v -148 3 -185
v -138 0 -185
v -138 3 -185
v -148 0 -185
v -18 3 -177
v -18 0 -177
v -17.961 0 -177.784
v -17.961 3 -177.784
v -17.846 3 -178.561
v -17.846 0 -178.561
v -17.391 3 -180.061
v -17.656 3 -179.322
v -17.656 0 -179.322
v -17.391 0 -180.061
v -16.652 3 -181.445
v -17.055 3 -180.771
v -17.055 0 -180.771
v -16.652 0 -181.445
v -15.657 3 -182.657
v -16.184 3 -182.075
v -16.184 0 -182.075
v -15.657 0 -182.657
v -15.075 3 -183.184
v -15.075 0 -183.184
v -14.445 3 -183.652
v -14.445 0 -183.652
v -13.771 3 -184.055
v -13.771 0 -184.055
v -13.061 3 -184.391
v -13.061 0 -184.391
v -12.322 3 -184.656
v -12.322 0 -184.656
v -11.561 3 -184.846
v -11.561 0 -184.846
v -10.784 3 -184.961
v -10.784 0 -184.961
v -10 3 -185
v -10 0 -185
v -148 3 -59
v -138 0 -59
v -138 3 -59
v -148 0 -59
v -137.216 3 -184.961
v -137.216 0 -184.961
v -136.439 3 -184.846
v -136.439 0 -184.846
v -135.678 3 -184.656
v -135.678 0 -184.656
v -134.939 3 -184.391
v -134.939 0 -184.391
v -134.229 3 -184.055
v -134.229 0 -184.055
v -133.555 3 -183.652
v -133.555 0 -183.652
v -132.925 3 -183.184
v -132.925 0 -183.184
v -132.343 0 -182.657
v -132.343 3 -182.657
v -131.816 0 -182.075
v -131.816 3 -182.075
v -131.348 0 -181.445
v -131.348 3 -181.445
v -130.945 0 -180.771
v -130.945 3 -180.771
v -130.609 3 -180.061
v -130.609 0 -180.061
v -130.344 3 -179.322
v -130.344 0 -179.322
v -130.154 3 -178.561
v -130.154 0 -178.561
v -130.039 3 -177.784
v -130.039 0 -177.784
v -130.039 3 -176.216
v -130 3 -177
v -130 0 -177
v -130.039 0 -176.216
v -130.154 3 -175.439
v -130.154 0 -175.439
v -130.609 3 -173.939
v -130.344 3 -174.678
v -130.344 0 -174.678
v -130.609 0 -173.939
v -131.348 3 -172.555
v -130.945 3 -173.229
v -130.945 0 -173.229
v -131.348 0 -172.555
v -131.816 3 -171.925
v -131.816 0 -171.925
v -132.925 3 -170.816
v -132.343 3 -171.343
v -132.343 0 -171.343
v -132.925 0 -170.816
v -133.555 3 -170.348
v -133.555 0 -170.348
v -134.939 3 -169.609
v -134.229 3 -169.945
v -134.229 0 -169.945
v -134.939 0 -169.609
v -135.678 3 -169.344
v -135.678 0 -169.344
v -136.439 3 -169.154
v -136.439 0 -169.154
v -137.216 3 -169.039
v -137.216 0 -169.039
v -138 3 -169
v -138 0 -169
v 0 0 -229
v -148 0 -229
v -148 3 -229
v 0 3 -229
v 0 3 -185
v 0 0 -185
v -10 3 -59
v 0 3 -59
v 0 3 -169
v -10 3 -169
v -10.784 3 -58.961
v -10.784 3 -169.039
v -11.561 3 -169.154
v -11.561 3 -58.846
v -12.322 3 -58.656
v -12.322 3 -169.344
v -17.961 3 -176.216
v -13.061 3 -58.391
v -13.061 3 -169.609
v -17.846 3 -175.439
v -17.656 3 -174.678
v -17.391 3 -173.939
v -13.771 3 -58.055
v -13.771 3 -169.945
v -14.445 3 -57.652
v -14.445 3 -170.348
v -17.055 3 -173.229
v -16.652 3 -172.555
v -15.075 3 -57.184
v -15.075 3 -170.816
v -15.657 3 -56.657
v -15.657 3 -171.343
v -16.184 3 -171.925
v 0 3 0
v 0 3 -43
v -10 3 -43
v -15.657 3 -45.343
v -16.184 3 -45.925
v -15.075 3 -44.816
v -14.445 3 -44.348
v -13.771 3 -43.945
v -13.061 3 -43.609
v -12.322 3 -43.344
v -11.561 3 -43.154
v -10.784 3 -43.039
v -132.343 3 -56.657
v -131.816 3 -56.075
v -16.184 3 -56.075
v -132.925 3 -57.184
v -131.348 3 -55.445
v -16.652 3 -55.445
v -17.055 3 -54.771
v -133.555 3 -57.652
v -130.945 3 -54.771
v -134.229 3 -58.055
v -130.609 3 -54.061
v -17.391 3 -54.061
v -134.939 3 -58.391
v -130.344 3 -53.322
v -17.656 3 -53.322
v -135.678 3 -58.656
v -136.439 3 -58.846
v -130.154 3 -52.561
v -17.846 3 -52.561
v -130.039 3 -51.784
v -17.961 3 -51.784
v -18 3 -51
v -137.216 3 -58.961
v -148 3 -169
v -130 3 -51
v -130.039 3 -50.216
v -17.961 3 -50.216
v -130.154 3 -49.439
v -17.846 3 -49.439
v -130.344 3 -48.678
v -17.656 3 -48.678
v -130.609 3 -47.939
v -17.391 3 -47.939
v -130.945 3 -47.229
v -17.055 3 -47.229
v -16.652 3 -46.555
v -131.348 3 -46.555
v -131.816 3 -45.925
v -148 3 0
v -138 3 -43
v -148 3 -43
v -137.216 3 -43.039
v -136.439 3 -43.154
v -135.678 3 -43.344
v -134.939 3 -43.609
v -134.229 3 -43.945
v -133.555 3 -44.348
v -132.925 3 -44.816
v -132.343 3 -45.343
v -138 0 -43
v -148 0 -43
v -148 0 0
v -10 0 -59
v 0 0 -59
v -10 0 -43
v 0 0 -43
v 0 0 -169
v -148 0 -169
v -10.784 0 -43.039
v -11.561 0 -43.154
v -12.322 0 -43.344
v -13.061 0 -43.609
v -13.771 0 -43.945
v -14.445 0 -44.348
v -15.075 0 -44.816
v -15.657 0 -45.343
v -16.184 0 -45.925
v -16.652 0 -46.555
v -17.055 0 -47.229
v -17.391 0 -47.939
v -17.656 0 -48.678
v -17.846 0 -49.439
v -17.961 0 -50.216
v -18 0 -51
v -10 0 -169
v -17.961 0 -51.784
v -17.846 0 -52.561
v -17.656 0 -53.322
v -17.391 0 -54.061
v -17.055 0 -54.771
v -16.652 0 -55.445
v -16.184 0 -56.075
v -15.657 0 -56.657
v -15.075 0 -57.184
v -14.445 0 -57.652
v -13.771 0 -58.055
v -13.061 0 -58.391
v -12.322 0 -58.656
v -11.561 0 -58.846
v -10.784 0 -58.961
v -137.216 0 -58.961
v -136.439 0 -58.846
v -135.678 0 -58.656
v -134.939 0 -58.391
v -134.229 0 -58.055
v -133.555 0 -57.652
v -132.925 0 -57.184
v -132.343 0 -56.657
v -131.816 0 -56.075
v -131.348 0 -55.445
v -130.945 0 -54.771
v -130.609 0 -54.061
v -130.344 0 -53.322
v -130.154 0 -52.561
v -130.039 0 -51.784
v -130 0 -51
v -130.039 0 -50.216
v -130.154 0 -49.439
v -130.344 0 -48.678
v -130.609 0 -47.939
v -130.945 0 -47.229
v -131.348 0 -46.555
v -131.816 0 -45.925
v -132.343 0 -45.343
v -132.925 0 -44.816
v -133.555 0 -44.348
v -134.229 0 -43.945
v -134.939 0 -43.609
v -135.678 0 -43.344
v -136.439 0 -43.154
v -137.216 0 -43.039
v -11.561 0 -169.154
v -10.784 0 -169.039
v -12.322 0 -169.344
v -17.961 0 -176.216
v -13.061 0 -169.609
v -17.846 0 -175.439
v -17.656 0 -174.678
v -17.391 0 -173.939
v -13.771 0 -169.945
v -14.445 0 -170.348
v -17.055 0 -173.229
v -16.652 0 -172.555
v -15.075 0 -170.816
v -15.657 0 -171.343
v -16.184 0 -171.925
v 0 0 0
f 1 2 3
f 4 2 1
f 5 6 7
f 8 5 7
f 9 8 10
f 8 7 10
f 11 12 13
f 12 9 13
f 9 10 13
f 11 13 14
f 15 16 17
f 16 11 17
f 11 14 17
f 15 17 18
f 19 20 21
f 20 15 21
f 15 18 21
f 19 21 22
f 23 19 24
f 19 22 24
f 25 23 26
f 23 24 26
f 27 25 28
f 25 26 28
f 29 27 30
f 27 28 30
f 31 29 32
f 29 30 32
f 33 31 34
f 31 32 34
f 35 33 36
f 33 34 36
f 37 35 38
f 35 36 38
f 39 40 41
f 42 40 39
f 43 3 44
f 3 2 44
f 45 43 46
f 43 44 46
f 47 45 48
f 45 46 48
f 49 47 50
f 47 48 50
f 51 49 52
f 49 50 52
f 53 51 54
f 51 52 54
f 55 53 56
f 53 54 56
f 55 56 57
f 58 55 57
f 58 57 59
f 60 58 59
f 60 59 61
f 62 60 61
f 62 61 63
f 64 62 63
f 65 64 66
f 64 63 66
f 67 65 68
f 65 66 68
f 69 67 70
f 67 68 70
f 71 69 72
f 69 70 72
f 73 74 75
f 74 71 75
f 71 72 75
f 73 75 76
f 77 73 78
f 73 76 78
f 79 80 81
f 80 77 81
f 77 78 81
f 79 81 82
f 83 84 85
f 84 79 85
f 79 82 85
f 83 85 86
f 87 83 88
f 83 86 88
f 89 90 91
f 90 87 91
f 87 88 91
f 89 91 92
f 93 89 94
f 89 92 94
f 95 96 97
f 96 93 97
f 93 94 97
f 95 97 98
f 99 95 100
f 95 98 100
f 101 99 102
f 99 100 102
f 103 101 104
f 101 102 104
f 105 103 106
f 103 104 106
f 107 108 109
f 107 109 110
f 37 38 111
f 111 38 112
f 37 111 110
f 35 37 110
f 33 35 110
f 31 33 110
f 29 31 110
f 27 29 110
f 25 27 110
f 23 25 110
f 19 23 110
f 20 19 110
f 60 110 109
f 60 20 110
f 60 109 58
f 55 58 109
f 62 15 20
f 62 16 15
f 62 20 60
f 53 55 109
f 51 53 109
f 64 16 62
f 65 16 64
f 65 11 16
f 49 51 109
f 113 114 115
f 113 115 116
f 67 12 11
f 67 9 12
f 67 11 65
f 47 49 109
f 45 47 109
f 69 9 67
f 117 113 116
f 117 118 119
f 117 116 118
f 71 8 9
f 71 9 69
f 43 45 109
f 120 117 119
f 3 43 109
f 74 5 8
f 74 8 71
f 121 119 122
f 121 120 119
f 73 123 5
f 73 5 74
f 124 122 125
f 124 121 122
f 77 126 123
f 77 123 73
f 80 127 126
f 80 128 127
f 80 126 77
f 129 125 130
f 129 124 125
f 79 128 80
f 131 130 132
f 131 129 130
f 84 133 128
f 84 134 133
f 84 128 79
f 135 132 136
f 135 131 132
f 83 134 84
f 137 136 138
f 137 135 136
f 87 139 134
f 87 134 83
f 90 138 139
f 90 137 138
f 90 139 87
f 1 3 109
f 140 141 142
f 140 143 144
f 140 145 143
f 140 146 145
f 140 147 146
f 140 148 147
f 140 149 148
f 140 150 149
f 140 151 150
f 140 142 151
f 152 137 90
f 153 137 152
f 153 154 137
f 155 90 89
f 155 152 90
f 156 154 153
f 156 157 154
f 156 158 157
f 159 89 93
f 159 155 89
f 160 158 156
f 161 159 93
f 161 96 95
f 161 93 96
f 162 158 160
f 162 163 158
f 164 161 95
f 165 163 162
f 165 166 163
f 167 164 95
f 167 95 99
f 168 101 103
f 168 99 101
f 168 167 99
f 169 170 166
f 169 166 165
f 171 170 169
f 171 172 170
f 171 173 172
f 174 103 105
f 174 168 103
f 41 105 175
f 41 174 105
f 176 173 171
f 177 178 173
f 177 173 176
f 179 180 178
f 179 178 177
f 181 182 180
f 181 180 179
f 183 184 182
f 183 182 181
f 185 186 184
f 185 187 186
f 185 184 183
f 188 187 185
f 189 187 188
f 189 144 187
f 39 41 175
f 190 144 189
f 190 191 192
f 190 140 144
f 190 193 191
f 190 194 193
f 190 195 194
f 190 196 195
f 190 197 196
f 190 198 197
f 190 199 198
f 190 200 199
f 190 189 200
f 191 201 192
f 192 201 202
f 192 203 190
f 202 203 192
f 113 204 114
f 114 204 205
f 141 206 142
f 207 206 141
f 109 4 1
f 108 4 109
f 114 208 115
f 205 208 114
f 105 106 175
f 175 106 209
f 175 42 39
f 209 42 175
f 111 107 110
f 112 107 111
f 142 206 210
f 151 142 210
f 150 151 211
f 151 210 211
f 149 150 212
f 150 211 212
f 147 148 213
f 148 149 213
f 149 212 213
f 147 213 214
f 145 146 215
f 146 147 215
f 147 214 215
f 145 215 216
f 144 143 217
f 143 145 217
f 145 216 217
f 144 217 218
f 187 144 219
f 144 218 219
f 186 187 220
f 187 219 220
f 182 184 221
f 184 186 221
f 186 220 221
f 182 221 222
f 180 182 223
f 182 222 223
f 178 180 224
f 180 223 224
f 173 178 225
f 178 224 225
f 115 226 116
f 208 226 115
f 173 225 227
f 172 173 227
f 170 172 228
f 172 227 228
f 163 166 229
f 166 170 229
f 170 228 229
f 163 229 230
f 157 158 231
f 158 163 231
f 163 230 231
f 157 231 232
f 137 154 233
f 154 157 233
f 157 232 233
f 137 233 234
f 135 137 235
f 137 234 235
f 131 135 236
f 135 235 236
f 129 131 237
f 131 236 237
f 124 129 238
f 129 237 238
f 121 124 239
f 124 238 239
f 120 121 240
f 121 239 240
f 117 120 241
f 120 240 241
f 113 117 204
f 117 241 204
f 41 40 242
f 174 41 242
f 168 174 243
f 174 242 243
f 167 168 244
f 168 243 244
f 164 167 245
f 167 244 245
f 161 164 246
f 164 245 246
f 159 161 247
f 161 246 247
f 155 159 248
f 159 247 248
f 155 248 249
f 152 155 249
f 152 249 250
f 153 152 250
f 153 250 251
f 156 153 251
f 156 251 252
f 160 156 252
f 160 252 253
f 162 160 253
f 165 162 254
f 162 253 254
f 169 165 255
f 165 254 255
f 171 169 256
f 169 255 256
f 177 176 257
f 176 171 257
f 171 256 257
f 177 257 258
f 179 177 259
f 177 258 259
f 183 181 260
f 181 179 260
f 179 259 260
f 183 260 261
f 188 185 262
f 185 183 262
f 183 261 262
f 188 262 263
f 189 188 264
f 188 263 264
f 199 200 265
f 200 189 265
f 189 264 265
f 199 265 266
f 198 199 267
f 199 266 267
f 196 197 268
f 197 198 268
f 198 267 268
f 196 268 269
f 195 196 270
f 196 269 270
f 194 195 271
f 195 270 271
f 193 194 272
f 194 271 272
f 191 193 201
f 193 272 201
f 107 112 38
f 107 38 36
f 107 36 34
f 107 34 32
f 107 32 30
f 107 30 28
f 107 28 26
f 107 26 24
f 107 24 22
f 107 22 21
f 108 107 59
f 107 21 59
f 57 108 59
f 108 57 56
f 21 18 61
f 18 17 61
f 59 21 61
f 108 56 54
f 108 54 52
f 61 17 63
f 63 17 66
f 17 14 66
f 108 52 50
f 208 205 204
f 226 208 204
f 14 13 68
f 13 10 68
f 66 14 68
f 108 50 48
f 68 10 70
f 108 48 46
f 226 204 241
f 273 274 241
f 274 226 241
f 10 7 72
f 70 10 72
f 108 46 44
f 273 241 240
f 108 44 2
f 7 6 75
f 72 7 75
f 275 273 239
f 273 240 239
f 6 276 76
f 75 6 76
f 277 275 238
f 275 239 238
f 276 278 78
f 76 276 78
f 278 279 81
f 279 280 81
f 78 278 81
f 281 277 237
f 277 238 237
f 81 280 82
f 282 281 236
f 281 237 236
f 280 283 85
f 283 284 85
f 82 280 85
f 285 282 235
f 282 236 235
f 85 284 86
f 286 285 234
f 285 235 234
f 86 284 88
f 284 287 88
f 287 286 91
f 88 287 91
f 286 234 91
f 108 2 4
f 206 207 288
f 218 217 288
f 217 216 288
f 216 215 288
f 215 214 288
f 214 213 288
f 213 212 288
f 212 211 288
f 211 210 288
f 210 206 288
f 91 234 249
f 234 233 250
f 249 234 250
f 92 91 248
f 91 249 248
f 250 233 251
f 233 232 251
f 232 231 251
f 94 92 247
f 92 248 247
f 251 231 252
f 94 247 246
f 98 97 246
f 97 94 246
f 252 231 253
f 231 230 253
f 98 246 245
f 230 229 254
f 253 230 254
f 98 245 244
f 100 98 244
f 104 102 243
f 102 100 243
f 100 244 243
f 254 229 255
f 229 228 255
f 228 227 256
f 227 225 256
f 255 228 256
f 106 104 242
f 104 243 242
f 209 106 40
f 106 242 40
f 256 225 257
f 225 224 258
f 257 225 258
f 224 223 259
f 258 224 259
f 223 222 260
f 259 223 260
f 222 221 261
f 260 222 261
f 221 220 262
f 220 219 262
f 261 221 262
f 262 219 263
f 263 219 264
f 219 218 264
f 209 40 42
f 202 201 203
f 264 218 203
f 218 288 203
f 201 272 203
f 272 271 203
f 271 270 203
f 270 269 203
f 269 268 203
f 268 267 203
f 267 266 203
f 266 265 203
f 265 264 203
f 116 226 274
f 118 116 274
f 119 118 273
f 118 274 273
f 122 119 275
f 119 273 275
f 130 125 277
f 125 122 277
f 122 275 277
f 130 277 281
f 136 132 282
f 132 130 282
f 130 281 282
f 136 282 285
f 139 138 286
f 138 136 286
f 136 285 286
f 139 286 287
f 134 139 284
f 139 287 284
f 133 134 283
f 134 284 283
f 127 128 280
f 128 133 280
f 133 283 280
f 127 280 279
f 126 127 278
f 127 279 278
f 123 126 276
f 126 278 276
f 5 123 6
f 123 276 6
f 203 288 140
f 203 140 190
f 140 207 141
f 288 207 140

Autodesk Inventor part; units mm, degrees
ref_plane "YZ Plane" through (0, 0, 0) normal (1, 0, 0) x (0, 1, 0)
ref_plane "XZ Plane" through (0, 0, 0) normal (0, 1, 0) x (-1, 0, 0)
ref_plane "XY Plane" through (0, 0, 0) normal (0, 0, 1) x (1, 0, 0)
sketch "Sketch1" plane through (0, 0, 0) normal (0, 1, 0) x (-1, 0, 0)
  line L0 (0, 0) -> (148, 0)
  line L1 (148, 0) -> (148, -229)
  line L2 (148, -229) -> (0, -229)
  line L3 (0, -229) -> (0, 0)
  line L4 (0, 0) -> (10, 0) construction
  line L5 (10, 0) -> (10, -51) construction
  circle A0 centre (10, -51) radius 8
  line L6 (10, -59) -> (0, -59)
  line L7 (10, -43) -> (0, -43)
  line L8 (10, -51) -> (10, -177) construction
  circle A1 centre (10, -177) radius 8
  line L9 (10, -169) -> (0, -169)
  line L10 (10, -185) -> (0, -185)
  line L11 (148, 0) -> (138, 0) construction
  line L12 (138, 0) -> (138, -51) construction
  circle A2 centre (138, -51) radius 8
  line L13 (138, -59) -> (148, -59)
  line L14 (138, -43) -> (148, -43)
  line L15 (138, -51) -> (138, -177) construction
  circle A3 centre (138, -177) radius 8
  line L16 (138, -185) -> (148, -185)
  line L17 (138, -169) -> (148, -169)
  dimension "d0" = 148
  dimension "d1" = 229
  dimension "d2" = 10
  dimension "d3" = 51
  dimension "d4" = 16
  dimension "d5" = 126
  dimension "d6" = 16
  dimension "d7" = 10
  dimension "d8" = 51
  dimension "d9" = 16
extrude "Extrusion1" add sketch "Sketch1" along normal blind 3 contours L0 L1 L14 A2 L13 L17 A3 L16 L2 L3 L10 A1 L9 L6 A0 L7
properties part number "heater"
